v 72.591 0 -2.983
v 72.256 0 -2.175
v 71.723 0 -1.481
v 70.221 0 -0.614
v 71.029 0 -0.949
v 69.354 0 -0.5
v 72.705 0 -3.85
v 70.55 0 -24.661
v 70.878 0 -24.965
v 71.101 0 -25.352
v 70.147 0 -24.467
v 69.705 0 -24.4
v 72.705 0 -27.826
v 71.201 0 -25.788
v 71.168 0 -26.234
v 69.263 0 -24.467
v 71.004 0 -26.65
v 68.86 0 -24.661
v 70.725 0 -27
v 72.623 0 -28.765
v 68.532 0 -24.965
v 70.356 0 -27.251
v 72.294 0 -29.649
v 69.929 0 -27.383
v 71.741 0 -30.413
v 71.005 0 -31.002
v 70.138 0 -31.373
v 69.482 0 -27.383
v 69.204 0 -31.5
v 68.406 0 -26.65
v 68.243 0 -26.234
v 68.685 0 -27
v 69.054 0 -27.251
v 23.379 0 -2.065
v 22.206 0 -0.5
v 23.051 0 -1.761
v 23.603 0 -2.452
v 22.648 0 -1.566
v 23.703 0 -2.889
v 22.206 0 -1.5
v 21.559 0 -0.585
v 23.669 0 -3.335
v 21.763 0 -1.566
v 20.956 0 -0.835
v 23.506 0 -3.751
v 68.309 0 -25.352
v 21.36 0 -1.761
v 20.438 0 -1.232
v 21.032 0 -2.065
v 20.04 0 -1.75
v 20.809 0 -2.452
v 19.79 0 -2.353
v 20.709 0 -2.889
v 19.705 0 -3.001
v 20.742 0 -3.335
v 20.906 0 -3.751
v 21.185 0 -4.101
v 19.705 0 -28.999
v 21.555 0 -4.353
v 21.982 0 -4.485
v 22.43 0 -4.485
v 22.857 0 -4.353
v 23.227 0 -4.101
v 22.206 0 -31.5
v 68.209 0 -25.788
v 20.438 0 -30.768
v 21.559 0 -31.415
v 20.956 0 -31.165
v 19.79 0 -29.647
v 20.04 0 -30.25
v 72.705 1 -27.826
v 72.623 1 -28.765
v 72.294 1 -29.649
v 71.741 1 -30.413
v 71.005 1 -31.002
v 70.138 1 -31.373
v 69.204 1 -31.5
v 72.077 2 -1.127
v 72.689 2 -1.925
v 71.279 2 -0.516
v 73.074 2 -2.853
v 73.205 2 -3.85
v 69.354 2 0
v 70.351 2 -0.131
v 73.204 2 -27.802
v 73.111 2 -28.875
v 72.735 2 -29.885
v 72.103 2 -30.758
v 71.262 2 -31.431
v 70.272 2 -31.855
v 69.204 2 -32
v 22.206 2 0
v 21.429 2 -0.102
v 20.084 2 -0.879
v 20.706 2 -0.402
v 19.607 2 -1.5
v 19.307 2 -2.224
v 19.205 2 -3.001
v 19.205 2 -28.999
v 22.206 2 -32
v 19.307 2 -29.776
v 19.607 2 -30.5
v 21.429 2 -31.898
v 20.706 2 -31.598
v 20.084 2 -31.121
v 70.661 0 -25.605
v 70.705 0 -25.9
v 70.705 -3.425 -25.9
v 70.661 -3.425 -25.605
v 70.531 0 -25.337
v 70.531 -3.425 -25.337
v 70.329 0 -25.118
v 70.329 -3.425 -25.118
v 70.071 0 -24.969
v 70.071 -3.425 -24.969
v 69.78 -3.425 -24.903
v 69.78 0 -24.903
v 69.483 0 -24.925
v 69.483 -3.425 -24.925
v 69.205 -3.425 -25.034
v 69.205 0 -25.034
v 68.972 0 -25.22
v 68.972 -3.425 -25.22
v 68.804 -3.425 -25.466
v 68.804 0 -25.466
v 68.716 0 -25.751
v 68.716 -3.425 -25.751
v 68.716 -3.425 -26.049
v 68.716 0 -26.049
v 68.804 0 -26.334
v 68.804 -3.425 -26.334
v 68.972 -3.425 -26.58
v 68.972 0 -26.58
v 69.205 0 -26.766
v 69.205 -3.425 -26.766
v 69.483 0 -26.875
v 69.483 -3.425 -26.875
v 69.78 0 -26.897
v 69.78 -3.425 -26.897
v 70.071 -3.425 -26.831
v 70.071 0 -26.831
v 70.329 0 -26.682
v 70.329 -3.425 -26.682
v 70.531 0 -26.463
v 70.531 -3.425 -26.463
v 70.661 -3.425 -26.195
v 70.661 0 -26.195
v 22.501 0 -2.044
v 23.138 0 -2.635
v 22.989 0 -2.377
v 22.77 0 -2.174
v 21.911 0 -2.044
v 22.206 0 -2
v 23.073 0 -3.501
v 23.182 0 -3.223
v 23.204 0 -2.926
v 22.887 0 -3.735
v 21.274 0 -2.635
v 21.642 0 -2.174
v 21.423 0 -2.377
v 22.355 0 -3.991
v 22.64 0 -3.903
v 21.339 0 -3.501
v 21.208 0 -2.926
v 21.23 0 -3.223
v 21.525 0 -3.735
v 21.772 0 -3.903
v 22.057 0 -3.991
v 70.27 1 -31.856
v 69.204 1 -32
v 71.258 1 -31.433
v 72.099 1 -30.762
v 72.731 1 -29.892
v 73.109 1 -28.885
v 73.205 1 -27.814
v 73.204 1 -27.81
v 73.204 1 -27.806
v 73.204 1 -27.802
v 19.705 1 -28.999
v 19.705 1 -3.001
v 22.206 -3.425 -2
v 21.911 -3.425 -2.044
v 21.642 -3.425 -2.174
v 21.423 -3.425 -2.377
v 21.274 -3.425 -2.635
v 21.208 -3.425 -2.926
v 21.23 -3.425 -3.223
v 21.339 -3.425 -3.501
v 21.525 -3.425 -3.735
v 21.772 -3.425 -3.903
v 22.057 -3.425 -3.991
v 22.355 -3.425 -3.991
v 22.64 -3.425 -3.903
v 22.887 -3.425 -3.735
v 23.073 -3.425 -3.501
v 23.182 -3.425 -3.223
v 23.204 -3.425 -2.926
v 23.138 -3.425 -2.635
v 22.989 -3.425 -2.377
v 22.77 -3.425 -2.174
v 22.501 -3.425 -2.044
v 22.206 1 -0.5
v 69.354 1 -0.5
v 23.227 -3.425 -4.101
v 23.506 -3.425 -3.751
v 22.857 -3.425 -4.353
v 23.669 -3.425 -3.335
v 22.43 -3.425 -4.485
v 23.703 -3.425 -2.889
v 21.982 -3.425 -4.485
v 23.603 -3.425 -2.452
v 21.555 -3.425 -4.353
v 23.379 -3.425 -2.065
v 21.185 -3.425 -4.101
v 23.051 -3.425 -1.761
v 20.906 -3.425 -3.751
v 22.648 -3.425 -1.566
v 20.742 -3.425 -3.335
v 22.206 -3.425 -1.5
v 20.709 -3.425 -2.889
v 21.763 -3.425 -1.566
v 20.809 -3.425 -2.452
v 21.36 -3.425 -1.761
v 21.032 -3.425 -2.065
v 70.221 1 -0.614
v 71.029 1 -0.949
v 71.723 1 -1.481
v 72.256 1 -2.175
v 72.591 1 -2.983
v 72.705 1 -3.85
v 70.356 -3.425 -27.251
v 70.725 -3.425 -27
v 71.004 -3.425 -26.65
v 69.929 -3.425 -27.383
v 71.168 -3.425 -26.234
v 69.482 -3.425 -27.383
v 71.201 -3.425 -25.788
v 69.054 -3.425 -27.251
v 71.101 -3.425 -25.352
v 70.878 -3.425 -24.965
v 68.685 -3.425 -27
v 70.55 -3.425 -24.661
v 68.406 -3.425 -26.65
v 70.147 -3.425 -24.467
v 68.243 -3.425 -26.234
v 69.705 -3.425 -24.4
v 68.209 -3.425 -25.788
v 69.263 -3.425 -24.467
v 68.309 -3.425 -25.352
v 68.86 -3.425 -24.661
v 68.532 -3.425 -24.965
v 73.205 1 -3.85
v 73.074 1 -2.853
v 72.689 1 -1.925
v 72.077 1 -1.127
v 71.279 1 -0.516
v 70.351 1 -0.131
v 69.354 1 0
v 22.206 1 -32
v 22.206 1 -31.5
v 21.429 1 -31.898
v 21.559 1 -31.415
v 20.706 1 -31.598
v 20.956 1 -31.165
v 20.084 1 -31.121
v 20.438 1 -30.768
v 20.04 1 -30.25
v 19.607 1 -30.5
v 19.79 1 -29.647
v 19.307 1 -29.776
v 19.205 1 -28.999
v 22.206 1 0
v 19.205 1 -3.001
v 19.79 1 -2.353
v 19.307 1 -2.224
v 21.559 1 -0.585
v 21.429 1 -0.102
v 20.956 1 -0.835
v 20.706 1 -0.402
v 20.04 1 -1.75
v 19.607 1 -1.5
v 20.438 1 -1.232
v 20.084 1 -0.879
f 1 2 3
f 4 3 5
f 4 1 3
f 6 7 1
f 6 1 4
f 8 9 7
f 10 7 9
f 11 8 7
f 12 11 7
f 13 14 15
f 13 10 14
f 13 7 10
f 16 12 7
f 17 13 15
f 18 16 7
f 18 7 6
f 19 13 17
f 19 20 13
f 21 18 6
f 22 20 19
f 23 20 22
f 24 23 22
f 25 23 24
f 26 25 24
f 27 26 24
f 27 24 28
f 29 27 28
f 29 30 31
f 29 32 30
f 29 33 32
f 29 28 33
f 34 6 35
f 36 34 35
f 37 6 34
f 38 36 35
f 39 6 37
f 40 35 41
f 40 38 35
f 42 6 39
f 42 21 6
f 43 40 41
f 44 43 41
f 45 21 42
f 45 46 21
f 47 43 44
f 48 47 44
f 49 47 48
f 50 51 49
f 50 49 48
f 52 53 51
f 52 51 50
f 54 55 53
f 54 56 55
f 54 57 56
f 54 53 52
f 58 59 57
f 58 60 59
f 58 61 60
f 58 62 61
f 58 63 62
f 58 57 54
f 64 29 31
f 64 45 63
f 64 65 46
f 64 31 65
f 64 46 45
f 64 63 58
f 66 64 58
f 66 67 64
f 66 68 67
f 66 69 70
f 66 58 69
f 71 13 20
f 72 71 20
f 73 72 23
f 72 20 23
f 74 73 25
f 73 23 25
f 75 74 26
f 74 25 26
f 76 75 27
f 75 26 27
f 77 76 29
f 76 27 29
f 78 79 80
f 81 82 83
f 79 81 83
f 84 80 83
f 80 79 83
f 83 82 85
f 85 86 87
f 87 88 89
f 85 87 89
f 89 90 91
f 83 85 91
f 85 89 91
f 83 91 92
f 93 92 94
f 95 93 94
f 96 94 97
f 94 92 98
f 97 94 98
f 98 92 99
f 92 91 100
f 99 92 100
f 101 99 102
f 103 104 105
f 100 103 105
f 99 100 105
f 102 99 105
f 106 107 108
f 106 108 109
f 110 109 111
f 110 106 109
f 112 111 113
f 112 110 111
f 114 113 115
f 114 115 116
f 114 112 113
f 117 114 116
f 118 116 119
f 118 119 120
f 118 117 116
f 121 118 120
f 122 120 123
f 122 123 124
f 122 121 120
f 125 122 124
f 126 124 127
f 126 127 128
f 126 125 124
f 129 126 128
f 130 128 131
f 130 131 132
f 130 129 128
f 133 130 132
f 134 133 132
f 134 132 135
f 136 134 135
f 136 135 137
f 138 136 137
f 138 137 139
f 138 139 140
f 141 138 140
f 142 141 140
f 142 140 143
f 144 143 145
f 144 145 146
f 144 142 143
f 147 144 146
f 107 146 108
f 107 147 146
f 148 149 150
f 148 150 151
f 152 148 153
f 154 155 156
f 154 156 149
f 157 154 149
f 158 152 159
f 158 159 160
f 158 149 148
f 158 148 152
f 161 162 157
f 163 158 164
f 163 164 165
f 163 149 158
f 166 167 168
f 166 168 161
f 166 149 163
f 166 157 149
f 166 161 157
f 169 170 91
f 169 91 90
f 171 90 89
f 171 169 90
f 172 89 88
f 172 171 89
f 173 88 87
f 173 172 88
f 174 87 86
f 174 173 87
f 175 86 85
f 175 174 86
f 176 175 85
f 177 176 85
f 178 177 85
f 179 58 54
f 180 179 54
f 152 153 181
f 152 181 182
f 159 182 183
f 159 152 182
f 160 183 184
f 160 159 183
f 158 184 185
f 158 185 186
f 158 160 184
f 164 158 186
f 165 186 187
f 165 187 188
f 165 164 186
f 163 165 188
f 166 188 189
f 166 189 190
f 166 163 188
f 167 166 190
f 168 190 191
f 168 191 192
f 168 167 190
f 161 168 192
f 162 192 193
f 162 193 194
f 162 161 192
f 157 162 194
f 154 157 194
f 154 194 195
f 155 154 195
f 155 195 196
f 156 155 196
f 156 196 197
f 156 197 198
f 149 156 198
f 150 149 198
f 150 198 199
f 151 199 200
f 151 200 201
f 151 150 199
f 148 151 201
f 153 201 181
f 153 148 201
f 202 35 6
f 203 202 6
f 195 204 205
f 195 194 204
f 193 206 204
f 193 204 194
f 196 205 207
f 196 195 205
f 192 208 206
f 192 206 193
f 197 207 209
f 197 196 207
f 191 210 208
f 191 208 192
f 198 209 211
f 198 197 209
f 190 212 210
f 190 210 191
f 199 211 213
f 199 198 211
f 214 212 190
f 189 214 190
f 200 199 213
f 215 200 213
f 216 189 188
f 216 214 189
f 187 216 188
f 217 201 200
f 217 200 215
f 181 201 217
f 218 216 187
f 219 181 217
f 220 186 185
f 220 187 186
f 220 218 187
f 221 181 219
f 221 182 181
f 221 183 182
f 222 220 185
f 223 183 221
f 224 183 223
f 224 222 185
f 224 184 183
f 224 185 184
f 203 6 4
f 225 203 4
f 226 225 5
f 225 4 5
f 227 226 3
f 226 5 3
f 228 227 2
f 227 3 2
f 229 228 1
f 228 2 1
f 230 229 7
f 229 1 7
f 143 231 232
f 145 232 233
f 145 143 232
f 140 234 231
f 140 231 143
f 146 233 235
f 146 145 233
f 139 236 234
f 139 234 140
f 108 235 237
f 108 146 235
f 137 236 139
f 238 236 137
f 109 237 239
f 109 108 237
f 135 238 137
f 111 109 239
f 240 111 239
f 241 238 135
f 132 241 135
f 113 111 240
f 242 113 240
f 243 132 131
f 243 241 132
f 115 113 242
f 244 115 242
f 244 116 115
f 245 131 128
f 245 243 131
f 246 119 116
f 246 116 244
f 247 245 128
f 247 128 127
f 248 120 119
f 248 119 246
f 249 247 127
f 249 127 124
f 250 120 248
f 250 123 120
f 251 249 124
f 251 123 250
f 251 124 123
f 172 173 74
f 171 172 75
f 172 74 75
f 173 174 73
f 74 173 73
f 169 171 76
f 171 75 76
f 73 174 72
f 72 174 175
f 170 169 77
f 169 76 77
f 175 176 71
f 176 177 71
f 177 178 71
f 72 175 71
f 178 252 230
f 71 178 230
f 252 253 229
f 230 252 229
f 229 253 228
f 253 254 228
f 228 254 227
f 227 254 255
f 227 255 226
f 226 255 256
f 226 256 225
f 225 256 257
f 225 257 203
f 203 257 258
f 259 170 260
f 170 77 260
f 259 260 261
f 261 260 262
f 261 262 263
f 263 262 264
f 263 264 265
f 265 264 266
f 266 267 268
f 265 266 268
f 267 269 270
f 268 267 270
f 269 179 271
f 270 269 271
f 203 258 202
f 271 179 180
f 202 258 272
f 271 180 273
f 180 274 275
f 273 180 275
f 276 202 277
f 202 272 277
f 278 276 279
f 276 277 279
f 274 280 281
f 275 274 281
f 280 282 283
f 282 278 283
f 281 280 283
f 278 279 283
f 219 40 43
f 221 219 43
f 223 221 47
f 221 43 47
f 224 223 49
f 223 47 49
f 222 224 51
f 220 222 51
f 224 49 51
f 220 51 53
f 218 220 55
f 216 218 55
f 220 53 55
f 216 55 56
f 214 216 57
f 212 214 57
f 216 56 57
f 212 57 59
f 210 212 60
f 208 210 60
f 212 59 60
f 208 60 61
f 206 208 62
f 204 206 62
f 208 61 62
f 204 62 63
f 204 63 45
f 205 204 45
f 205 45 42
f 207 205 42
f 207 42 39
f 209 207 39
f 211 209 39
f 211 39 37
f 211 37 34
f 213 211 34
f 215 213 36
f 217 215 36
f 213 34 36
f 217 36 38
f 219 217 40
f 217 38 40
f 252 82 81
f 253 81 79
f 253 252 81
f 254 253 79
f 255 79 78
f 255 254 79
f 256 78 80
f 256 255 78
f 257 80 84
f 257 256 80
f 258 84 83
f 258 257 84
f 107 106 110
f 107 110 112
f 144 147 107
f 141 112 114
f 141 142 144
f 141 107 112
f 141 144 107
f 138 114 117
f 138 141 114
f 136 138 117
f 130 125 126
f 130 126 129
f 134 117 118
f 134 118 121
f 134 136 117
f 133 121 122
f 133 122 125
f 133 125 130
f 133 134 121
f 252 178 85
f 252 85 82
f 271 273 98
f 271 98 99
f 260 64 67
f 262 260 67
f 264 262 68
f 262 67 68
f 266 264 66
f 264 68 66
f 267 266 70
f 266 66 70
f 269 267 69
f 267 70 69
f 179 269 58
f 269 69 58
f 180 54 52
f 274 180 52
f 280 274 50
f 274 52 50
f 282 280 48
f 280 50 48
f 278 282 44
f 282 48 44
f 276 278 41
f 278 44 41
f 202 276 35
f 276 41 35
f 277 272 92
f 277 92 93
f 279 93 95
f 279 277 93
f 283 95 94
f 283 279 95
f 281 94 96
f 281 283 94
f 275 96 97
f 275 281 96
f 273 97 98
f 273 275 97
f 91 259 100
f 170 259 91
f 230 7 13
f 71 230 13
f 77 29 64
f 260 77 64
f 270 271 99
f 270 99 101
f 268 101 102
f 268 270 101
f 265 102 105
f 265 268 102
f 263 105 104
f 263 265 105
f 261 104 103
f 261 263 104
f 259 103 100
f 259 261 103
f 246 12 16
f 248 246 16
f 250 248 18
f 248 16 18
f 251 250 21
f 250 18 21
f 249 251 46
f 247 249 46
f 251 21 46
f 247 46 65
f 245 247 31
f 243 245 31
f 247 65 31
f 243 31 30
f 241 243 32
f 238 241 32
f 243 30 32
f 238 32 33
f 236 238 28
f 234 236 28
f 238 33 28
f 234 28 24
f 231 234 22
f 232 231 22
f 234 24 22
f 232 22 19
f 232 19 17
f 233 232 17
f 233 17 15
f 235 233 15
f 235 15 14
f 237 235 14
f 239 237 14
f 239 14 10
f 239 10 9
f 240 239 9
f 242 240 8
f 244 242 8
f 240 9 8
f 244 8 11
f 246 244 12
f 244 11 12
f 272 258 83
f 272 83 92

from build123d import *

# Parameters (mm, degrees)
Y_KSEKLIK_EKSTR_ZYON1_DEPTH = 2
KES_EKSTR_ZYON1_DEPTH       = 1
IZIM6_R                     = 1.501031458
IZIM6_R_2                   = 1.001031998
IZIM6_R_3                   = 1.5
IZIM6_R_4                   = 1.00000054
Y_KSEKLIK_EKSTR_ZYON3_DEPTH = 3.425399462


with BuildPart() as part:
    # Çizim1 → Yükseklik-Ekstrüzyon1 (new body)
    with BuildSketch(Plane(origin=(0, 0, 0), x_dir=(1, 0, 0), z_dir=(0, 1, 0))):
        with BuildLine():
            Line((69.354296896, 0), (22.205894341, 0))
            ThreePointArc((22.205894341, 0), (20.084057526, 0.878893586), (19.20516394, 3.000730401))
            Line((19.20516394, 3.000730401), (19.20516394, 28.999269019))
            ThreePointArc((19.20516394, 28.999269019), (20.084057735, 31.121106339), (22.205895054, 32.000000134))
            Line((22.205895054, 32.000000134), (69.204054025, 31.999999983))
            ThreePointArc((69.204054025, 31.999999983), (72.103447224, 30.757719929), (73.203992826, 27.80161776))
            Line((73.203992826, 27.80161776), (73.205163894, 3.84969587))
            ThreePointArc((73.205163894, 3.84969587), (72.076857039, 1.127478795), (69.354296896, 0))
        make_face()
    extrude(amount=Y_KSEKLIK_EKSTR_ZYON1_DEPTH)

    # Çizim2 → Kes-Ekstrüzyon1 (cut)
    with BuildSketch(Plane.XZ):
        with BuildLine():
            Line((22.205894341, 0), (69.354296896, 0))
            ThreePointArc((69.354296896, 0), (72.076886077, -1.127507843), (73.205163905, -3.849778017))
            Line((73.205163905, -3.849778017), (73.204578669, -27.814116173))
            ThreePointArc((73.204578669, -27.814116173), (72.09912832, -30.762246017), (69.204054025, -31.999999983))
            Line((69.204054025, -31.999999983), (22.205895054, -32.000000134))
            ThreePointArc((22.205895054, -32.000000134), (20.084057735, -31.121106339), (19.20516394, -28.999269019))
            Line((19.20516394, -28.999269019), (19.20516394, -3.000730401))
            ThreePointArc((19.20516394, -3.000730401), (20.084057526, -0.878893586), (22.205894341, 0))
        make_face()
        with BuildLine():
            Line((22.205894341, -0.5), (69.354296896, -0.5))
            ThreePointArc((69.354296896, -0.5), (71.723357422, -1.481085951), (72.705163917, -3.849847954))
            Line((72.705163917, -3.849847954), (72.704578383, -27.82580896))
            ThreePointArc((72.704578383, -27.82580896), (71.741441976, -30.412825453), (69.204054025, -31.499999983))
            Line((69.204054025, -31.499999983), (22.205895054, -31.500000134))
            ThreePointArc((22.205895054, -31.500000134), (20.437611125, -30.767552948), (19.70516394, -28.999269019))
            Line((19.70516394, -28.999269019), (19.70516394, -3.000730401))
            ThreePointArc((19.70516394, -3.000730401), (20.437610916, -1.232446977), (22.205894341, -0.5))
        make_face(mode=Mode.SUBTRACT)
    extrude(amount=-KES_EKSTR_ZYON1_DEPTH, mode=Mode.SUBTRACT)

    # Çizim6 → Yükseklik-Ekstrüzyon3 (add)
    # profile 1 of 2: a face of its own
    with BuildSketch(Plane.XZ):
        with Locations(Location((22.205894341, -3.000730401, 0), (0, 0, 90))):
            Circle(IZIM6_R)
        with Locations(Location((22.205894341, -3.000730401, 0), (0, 0, 90))):
            Circle(IZIM6_R_2, mode=Mode.SUBTRACT)
    # profile 2 of 2: a face of its own
    with BuildSketch(Plane.XZ):
        with Locations(Location((69.70516394, -25.900001, 0), (0, 0, 90))):
            Circle(IZIM6_R_3)
        with Locations((69.70516394, -25.900001)):
            Circle(IZIM6_R_4, mode=Mode.SUBTRACT)
    extrude(amount=Y_KSEKLIK_EKSTR_ZYON3_DEPTH)


solid = part.part
